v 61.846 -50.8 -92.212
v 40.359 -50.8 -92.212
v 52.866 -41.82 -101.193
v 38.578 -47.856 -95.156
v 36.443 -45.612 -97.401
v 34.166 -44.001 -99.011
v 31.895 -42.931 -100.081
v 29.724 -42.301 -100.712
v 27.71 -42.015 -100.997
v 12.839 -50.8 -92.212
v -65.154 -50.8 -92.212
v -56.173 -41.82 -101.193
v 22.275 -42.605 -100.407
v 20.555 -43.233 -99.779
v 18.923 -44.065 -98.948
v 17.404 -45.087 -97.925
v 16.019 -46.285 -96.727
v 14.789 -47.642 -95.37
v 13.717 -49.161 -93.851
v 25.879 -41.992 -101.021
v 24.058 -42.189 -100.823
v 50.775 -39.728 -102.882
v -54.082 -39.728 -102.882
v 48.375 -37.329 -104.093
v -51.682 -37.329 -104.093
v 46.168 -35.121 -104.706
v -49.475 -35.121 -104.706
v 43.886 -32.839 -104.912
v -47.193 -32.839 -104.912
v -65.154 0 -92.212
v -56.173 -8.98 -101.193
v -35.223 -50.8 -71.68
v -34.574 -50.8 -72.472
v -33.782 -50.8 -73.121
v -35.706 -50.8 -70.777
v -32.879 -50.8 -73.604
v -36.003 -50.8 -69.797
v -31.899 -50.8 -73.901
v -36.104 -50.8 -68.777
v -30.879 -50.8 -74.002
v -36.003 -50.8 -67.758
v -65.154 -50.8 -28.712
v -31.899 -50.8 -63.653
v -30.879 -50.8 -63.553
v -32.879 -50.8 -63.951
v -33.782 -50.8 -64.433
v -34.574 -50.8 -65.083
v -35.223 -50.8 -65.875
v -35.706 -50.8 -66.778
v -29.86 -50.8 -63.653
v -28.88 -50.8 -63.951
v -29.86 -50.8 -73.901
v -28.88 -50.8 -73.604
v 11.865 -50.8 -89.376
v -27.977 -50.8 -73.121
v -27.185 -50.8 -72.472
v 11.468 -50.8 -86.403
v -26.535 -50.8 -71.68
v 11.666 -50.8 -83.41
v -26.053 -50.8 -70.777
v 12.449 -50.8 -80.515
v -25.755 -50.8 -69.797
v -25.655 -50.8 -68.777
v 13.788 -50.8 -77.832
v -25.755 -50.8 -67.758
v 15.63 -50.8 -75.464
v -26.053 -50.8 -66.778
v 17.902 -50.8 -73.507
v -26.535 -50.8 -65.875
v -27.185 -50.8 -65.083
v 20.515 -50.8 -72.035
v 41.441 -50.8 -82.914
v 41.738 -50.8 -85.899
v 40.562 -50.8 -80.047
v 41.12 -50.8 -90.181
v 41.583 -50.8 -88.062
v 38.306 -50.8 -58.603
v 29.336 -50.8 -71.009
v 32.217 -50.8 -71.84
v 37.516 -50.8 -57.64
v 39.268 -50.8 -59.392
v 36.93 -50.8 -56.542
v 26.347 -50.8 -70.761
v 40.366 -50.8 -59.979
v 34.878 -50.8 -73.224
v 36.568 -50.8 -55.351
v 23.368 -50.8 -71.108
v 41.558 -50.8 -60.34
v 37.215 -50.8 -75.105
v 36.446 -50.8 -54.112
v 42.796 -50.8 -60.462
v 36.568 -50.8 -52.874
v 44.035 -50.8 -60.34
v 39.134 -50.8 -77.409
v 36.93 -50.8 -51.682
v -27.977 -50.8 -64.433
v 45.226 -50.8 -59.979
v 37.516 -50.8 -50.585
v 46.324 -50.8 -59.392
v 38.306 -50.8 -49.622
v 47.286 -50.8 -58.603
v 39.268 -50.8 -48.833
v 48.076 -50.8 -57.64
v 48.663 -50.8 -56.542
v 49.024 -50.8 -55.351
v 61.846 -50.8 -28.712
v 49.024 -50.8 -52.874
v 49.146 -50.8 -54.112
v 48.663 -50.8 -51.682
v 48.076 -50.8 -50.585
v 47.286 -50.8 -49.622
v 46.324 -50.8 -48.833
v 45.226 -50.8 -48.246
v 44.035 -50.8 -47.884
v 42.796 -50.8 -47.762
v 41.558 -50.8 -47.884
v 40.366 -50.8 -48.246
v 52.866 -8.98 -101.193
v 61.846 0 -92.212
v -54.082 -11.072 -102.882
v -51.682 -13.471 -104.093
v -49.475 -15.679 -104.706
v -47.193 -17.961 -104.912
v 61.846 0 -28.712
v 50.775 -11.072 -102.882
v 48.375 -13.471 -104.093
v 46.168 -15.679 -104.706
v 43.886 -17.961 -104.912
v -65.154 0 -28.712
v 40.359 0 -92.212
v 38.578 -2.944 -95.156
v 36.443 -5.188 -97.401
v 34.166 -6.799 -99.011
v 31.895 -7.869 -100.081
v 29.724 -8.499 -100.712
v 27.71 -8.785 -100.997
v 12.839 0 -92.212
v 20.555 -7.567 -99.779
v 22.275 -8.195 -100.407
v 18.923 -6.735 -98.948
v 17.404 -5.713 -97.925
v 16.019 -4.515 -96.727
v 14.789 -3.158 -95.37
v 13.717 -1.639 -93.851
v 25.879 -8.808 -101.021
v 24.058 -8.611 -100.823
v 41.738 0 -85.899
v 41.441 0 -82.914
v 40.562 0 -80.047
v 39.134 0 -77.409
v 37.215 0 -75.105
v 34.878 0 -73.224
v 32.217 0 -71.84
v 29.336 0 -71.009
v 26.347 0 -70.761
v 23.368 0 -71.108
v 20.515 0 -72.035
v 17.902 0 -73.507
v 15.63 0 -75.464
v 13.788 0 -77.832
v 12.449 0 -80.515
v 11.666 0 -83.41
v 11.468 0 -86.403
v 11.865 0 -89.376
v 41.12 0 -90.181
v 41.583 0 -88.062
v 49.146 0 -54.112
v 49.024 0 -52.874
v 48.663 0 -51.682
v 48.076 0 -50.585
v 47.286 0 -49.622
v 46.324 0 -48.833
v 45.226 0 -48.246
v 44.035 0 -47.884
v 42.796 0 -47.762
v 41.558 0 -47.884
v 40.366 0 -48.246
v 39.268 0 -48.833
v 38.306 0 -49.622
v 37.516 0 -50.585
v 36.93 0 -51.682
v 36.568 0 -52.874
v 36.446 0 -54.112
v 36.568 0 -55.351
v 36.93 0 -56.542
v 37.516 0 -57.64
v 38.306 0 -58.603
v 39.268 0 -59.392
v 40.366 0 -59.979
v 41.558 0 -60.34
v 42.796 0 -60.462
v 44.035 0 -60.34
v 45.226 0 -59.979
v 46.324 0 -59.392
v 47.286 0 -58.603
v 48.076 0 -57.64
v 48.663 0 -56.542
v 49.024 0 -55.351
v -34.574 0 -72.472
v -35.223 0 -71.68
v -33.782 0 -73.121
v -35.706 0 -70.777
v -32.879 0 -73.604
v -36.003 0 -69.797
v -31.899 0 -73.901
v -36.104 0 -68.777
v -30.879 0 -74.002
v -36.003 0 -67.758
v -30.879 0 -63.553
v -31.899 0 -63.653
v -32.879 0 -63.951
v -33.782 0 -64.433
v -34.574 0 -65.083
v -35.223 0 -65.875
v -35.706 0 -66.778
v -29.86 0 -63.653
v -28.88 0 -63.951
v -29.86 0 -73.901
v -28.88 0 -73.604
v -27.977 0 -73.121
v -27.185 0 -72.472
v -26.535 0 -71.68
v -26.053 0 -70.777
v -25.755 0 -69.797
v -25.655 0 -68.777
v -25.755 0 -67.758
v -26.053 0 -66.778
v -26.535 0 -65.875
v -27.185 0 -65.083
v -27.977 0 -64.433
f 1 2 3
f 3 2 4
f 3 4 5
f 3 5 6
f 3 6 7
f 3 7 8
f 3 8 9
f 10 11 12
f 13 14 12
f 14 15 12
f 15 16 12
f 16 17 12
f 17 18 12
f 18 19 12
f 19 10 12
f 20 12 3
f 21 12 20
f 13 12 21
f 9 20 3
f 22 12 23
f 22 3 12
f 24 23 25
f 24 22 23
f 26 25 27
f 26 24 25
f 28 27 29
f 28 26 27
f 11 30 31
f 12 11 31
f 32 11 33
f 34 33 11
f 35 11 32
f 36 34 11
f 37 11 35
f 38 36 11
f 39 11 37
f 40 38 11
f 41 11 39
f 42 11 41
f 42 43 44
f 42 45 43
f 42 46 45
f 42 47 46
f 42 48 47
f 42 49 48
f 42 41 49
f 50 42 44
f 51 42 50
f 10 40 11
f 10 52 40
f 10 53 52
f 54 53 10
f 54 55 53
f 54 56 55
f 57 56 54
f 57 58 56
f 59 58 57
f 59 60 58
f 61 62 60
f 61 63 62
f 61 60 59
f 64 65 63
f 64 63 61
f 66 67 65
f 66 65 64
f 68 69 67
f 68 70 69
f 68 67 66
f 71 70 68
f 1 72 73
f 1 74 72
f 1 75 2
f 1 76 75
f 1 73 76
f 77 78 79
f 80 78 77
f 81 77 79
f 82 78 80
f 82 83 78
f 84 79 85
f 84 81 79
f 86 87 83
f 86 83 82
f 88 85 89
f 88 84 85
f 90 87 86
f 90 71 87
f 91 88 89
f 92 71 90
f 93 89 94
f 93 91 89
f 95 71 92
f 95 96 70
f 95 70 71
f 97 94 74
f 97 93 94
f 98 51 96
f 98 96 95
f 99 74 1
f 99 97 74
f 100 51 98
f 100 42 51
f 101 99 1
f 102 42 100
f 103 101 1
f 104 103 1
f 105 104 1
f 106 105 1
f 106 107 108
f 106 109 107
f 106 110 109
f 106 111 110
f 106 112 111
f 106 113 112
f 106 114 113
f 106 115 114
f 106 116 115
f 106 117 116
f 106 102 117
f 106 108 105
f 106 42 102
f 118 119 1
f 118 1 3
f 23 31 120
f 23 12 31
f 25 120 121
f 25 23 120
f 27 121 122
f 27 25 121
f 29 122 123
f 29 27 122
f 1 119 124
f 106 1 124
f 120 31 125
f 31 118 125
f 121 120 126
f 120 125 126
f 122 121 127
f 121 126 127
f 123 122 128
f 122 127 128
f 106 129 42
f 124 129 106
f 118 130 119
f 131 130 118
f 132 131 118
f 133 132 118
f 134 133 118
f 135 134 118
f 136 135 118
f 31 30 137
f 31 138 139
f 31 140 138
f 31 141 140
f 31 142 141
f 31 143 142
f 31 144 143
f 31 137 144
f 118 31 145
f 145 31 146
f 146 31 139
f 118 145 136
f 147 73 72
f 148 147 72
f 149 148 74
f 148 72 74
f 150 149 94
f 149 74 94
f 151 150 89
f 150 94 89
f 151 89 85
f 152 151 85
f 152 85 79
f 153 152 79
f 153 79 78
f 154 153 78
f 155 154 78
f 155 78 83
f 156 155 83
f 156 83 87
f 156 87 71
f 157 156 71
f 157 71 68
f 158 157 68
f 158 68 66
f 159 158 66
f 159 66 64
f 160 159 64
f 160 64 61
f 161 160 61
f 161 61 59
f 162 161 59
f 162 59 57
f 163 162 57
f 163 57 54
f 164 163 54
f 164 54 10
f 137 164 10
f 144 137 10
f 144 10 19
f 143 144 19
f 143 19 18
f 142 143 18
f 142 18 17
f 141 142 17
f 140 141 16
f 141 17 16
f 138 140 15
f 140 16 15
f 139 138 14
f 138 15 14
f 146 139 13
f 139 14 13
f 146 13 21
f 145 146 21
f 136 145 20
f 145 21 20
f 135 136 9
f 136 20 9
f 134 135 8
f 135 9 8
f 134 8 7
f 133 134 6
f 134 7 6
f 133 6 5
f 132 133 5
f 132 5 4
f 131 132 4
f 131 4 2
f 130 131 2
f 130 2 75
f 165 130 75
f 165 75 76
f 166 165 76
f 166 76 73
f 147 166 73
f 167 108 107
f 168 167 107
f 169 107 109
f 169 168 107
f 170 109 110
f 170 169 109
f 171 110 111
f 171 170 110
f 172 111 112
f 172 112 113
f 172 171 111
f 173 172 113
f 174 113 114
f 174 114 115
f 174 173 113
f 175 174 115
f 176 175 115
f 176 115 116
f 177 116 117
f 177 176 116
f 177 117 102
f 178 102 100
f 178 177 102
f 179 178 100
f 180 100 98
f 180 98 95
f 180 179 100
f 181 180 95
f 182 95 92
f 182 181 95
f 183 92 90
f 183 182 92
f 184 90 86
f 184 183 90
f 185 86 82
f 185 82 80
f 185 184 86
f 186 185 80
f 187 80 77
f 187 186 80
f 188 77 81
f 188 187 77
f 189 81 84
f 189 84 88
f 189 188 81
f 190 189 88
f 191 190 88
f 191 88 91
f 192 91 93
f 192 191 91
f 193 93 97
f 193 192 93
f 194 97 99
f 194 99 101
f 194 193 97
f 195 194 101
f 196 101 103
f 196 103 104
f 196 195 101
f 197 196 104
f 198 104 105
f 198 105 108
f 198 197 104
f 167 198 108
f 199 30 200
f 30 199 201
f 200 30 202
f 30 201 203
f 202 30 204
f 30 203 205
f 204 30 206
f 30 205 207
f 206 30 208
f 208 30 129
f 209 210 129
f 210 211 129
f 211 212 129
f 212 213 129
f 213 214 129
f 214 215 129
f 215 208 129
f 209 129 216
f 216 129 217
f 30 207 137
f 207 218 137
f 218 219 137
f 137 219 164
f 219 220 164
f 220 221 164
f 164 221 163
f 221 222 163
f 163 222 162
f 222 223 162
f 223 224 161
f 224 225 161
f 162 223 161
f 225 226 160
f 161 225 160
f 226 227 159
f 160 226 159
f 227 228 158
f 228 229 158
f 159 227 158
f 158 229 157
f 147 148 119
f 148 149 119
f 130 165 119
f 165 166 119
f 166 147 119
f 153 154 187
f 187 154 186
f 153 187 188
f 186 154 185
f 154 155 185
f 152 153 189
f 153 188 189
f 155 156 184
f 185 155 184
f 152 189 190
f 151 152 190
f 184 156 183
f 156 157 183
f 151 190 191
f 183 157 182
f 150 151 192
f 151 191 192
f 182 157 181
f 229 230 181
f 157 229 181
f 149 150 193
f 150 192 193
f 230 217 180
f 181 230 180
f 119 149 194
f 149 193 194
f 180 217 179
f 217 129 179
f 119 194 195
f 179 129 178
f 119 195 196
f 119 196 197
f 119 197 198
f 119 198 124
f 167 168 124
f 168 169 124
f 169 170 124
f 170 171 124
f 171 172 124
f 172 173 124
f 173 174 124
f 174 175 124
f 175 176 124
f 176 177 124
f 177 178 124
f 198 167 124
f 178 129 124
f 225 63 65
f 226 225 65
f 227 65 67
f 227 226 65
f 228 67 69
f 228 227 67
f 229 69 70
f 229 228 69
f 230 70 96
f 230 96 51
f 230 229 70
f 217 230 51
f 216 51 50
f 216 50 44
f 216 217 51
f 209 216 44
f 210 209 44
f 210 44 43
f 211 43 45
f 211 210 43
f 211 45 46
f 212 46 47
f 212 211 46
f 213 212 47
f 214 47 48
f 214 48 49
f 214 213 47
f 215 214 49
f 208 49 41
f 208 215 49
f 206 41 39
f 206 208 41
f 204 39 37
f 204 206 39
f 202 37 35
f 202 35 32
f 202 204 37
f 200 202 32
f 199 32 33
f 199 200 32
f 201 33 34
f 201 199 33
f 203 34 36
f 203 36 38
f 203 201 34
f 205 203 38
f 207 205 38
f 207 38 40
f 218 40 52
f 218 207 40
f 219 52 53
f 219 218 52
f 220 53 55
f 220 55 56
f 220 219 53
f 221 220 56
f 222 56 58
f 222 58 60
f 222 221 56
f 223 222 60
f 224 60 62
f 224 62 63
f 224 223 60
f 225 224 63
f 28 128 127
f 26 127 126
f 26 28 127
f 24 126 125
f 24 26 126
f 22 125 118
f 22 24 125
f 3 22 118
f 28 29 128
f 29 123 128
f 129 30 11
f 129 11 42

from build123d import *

# Parameters (mm, degrees)
F0_W        = 127
F0_H        = 76.2
F0_R        = 5.2244265331
F0_R_2      = 6.35
F1_DEPTH    = 50.8
F2_R        = 15.1393609574
F3_DEPTH    = 138.938
F4_T1_DEPTH = 116.1207478943
F4_T3_DEPTH = 192.3207478943
F5_R        = 12.7


# Not quite as in the source:
# - a fillet or chamfer that OpenCascade refuses, or shapes differently, is made with other operations: its cross-section is extruded or revolved along the edge and cut away or added


with BuildPart() as f1:
    # F0 (on Front) → F1 (new body)
    with BuildSketch(Plane.XZ):
        with Locations((-1.653669402, -66.8124542732)):
            Rectangle(F0_W, F0_H)
        with Locations((-30.8793820441, -68.7773153186)):
            Circle(F0_R, mode=Mode.SUBTRACT)
        with Locations((42.796330598, -54.1124542732)):
            Circle(F0_R_2, mode=Mode.SUBTRACT)
    extrude(amount=F1_DEPTH)

    # F2 (on face) → F3 (cut)
    with BuildSketch(Plane.XZ.offset(50.8)):
        with Locations((26.5990737826, -85.8985558152)):
            Circle(F2_R)
    extrude(amount=-F3_DEPTH, mode=Mode.SUBTRACT)

    # F4: chamfer of 12.7 on 4 edges, made by hand

    # F4_s2 → F4_t1 (cut)
    with BuildSketch(Plane.XZ.offset(-32.6603739472)):
        Polygon((61.846330598, -92.2124542732), (49.146330598, -104.9124542732), (61.846330598, -104.9124542732), align=None)
        Polygon((-65.153669402, -92.2124542732), (-52.453669402, -104.9124542732), (-65.153669402, -104.9124542732), align=None)
    extrude(amount=F4_T1_DEPTH, mode=Mode.SUBTRACT)

    # F4_s4 → F4_t3 (cut)
    with BuildSketch(Plane.YZ.offset(-97.8140433492)):
        Polygon((-50.8, -92.2124542732), (-38.1, -104.9124542732), (-50.8, -104.9124542732), align=None)
        Polygon((0, -92.2124542732), (-12.7, -104.9124542732), (0, -104.9124542732), align=None)
    extrude(amount=F4_T3_DEPTH, mode=Mode.SUBTRACT)

    # F5
    f5_edges = [f1.edges().sort_by_distance(p)[0] for p in [
        (-1.653669, -38.1, -104.912454),
        (-1.653669, -12.7, -104.912454),
        (49.146331, -25.4, -104.912454),
        (-52.453669, -25.4, -104.912454),
    ]]
    fillet(f5_edges, radius=F5_R)


solid = f1.part
